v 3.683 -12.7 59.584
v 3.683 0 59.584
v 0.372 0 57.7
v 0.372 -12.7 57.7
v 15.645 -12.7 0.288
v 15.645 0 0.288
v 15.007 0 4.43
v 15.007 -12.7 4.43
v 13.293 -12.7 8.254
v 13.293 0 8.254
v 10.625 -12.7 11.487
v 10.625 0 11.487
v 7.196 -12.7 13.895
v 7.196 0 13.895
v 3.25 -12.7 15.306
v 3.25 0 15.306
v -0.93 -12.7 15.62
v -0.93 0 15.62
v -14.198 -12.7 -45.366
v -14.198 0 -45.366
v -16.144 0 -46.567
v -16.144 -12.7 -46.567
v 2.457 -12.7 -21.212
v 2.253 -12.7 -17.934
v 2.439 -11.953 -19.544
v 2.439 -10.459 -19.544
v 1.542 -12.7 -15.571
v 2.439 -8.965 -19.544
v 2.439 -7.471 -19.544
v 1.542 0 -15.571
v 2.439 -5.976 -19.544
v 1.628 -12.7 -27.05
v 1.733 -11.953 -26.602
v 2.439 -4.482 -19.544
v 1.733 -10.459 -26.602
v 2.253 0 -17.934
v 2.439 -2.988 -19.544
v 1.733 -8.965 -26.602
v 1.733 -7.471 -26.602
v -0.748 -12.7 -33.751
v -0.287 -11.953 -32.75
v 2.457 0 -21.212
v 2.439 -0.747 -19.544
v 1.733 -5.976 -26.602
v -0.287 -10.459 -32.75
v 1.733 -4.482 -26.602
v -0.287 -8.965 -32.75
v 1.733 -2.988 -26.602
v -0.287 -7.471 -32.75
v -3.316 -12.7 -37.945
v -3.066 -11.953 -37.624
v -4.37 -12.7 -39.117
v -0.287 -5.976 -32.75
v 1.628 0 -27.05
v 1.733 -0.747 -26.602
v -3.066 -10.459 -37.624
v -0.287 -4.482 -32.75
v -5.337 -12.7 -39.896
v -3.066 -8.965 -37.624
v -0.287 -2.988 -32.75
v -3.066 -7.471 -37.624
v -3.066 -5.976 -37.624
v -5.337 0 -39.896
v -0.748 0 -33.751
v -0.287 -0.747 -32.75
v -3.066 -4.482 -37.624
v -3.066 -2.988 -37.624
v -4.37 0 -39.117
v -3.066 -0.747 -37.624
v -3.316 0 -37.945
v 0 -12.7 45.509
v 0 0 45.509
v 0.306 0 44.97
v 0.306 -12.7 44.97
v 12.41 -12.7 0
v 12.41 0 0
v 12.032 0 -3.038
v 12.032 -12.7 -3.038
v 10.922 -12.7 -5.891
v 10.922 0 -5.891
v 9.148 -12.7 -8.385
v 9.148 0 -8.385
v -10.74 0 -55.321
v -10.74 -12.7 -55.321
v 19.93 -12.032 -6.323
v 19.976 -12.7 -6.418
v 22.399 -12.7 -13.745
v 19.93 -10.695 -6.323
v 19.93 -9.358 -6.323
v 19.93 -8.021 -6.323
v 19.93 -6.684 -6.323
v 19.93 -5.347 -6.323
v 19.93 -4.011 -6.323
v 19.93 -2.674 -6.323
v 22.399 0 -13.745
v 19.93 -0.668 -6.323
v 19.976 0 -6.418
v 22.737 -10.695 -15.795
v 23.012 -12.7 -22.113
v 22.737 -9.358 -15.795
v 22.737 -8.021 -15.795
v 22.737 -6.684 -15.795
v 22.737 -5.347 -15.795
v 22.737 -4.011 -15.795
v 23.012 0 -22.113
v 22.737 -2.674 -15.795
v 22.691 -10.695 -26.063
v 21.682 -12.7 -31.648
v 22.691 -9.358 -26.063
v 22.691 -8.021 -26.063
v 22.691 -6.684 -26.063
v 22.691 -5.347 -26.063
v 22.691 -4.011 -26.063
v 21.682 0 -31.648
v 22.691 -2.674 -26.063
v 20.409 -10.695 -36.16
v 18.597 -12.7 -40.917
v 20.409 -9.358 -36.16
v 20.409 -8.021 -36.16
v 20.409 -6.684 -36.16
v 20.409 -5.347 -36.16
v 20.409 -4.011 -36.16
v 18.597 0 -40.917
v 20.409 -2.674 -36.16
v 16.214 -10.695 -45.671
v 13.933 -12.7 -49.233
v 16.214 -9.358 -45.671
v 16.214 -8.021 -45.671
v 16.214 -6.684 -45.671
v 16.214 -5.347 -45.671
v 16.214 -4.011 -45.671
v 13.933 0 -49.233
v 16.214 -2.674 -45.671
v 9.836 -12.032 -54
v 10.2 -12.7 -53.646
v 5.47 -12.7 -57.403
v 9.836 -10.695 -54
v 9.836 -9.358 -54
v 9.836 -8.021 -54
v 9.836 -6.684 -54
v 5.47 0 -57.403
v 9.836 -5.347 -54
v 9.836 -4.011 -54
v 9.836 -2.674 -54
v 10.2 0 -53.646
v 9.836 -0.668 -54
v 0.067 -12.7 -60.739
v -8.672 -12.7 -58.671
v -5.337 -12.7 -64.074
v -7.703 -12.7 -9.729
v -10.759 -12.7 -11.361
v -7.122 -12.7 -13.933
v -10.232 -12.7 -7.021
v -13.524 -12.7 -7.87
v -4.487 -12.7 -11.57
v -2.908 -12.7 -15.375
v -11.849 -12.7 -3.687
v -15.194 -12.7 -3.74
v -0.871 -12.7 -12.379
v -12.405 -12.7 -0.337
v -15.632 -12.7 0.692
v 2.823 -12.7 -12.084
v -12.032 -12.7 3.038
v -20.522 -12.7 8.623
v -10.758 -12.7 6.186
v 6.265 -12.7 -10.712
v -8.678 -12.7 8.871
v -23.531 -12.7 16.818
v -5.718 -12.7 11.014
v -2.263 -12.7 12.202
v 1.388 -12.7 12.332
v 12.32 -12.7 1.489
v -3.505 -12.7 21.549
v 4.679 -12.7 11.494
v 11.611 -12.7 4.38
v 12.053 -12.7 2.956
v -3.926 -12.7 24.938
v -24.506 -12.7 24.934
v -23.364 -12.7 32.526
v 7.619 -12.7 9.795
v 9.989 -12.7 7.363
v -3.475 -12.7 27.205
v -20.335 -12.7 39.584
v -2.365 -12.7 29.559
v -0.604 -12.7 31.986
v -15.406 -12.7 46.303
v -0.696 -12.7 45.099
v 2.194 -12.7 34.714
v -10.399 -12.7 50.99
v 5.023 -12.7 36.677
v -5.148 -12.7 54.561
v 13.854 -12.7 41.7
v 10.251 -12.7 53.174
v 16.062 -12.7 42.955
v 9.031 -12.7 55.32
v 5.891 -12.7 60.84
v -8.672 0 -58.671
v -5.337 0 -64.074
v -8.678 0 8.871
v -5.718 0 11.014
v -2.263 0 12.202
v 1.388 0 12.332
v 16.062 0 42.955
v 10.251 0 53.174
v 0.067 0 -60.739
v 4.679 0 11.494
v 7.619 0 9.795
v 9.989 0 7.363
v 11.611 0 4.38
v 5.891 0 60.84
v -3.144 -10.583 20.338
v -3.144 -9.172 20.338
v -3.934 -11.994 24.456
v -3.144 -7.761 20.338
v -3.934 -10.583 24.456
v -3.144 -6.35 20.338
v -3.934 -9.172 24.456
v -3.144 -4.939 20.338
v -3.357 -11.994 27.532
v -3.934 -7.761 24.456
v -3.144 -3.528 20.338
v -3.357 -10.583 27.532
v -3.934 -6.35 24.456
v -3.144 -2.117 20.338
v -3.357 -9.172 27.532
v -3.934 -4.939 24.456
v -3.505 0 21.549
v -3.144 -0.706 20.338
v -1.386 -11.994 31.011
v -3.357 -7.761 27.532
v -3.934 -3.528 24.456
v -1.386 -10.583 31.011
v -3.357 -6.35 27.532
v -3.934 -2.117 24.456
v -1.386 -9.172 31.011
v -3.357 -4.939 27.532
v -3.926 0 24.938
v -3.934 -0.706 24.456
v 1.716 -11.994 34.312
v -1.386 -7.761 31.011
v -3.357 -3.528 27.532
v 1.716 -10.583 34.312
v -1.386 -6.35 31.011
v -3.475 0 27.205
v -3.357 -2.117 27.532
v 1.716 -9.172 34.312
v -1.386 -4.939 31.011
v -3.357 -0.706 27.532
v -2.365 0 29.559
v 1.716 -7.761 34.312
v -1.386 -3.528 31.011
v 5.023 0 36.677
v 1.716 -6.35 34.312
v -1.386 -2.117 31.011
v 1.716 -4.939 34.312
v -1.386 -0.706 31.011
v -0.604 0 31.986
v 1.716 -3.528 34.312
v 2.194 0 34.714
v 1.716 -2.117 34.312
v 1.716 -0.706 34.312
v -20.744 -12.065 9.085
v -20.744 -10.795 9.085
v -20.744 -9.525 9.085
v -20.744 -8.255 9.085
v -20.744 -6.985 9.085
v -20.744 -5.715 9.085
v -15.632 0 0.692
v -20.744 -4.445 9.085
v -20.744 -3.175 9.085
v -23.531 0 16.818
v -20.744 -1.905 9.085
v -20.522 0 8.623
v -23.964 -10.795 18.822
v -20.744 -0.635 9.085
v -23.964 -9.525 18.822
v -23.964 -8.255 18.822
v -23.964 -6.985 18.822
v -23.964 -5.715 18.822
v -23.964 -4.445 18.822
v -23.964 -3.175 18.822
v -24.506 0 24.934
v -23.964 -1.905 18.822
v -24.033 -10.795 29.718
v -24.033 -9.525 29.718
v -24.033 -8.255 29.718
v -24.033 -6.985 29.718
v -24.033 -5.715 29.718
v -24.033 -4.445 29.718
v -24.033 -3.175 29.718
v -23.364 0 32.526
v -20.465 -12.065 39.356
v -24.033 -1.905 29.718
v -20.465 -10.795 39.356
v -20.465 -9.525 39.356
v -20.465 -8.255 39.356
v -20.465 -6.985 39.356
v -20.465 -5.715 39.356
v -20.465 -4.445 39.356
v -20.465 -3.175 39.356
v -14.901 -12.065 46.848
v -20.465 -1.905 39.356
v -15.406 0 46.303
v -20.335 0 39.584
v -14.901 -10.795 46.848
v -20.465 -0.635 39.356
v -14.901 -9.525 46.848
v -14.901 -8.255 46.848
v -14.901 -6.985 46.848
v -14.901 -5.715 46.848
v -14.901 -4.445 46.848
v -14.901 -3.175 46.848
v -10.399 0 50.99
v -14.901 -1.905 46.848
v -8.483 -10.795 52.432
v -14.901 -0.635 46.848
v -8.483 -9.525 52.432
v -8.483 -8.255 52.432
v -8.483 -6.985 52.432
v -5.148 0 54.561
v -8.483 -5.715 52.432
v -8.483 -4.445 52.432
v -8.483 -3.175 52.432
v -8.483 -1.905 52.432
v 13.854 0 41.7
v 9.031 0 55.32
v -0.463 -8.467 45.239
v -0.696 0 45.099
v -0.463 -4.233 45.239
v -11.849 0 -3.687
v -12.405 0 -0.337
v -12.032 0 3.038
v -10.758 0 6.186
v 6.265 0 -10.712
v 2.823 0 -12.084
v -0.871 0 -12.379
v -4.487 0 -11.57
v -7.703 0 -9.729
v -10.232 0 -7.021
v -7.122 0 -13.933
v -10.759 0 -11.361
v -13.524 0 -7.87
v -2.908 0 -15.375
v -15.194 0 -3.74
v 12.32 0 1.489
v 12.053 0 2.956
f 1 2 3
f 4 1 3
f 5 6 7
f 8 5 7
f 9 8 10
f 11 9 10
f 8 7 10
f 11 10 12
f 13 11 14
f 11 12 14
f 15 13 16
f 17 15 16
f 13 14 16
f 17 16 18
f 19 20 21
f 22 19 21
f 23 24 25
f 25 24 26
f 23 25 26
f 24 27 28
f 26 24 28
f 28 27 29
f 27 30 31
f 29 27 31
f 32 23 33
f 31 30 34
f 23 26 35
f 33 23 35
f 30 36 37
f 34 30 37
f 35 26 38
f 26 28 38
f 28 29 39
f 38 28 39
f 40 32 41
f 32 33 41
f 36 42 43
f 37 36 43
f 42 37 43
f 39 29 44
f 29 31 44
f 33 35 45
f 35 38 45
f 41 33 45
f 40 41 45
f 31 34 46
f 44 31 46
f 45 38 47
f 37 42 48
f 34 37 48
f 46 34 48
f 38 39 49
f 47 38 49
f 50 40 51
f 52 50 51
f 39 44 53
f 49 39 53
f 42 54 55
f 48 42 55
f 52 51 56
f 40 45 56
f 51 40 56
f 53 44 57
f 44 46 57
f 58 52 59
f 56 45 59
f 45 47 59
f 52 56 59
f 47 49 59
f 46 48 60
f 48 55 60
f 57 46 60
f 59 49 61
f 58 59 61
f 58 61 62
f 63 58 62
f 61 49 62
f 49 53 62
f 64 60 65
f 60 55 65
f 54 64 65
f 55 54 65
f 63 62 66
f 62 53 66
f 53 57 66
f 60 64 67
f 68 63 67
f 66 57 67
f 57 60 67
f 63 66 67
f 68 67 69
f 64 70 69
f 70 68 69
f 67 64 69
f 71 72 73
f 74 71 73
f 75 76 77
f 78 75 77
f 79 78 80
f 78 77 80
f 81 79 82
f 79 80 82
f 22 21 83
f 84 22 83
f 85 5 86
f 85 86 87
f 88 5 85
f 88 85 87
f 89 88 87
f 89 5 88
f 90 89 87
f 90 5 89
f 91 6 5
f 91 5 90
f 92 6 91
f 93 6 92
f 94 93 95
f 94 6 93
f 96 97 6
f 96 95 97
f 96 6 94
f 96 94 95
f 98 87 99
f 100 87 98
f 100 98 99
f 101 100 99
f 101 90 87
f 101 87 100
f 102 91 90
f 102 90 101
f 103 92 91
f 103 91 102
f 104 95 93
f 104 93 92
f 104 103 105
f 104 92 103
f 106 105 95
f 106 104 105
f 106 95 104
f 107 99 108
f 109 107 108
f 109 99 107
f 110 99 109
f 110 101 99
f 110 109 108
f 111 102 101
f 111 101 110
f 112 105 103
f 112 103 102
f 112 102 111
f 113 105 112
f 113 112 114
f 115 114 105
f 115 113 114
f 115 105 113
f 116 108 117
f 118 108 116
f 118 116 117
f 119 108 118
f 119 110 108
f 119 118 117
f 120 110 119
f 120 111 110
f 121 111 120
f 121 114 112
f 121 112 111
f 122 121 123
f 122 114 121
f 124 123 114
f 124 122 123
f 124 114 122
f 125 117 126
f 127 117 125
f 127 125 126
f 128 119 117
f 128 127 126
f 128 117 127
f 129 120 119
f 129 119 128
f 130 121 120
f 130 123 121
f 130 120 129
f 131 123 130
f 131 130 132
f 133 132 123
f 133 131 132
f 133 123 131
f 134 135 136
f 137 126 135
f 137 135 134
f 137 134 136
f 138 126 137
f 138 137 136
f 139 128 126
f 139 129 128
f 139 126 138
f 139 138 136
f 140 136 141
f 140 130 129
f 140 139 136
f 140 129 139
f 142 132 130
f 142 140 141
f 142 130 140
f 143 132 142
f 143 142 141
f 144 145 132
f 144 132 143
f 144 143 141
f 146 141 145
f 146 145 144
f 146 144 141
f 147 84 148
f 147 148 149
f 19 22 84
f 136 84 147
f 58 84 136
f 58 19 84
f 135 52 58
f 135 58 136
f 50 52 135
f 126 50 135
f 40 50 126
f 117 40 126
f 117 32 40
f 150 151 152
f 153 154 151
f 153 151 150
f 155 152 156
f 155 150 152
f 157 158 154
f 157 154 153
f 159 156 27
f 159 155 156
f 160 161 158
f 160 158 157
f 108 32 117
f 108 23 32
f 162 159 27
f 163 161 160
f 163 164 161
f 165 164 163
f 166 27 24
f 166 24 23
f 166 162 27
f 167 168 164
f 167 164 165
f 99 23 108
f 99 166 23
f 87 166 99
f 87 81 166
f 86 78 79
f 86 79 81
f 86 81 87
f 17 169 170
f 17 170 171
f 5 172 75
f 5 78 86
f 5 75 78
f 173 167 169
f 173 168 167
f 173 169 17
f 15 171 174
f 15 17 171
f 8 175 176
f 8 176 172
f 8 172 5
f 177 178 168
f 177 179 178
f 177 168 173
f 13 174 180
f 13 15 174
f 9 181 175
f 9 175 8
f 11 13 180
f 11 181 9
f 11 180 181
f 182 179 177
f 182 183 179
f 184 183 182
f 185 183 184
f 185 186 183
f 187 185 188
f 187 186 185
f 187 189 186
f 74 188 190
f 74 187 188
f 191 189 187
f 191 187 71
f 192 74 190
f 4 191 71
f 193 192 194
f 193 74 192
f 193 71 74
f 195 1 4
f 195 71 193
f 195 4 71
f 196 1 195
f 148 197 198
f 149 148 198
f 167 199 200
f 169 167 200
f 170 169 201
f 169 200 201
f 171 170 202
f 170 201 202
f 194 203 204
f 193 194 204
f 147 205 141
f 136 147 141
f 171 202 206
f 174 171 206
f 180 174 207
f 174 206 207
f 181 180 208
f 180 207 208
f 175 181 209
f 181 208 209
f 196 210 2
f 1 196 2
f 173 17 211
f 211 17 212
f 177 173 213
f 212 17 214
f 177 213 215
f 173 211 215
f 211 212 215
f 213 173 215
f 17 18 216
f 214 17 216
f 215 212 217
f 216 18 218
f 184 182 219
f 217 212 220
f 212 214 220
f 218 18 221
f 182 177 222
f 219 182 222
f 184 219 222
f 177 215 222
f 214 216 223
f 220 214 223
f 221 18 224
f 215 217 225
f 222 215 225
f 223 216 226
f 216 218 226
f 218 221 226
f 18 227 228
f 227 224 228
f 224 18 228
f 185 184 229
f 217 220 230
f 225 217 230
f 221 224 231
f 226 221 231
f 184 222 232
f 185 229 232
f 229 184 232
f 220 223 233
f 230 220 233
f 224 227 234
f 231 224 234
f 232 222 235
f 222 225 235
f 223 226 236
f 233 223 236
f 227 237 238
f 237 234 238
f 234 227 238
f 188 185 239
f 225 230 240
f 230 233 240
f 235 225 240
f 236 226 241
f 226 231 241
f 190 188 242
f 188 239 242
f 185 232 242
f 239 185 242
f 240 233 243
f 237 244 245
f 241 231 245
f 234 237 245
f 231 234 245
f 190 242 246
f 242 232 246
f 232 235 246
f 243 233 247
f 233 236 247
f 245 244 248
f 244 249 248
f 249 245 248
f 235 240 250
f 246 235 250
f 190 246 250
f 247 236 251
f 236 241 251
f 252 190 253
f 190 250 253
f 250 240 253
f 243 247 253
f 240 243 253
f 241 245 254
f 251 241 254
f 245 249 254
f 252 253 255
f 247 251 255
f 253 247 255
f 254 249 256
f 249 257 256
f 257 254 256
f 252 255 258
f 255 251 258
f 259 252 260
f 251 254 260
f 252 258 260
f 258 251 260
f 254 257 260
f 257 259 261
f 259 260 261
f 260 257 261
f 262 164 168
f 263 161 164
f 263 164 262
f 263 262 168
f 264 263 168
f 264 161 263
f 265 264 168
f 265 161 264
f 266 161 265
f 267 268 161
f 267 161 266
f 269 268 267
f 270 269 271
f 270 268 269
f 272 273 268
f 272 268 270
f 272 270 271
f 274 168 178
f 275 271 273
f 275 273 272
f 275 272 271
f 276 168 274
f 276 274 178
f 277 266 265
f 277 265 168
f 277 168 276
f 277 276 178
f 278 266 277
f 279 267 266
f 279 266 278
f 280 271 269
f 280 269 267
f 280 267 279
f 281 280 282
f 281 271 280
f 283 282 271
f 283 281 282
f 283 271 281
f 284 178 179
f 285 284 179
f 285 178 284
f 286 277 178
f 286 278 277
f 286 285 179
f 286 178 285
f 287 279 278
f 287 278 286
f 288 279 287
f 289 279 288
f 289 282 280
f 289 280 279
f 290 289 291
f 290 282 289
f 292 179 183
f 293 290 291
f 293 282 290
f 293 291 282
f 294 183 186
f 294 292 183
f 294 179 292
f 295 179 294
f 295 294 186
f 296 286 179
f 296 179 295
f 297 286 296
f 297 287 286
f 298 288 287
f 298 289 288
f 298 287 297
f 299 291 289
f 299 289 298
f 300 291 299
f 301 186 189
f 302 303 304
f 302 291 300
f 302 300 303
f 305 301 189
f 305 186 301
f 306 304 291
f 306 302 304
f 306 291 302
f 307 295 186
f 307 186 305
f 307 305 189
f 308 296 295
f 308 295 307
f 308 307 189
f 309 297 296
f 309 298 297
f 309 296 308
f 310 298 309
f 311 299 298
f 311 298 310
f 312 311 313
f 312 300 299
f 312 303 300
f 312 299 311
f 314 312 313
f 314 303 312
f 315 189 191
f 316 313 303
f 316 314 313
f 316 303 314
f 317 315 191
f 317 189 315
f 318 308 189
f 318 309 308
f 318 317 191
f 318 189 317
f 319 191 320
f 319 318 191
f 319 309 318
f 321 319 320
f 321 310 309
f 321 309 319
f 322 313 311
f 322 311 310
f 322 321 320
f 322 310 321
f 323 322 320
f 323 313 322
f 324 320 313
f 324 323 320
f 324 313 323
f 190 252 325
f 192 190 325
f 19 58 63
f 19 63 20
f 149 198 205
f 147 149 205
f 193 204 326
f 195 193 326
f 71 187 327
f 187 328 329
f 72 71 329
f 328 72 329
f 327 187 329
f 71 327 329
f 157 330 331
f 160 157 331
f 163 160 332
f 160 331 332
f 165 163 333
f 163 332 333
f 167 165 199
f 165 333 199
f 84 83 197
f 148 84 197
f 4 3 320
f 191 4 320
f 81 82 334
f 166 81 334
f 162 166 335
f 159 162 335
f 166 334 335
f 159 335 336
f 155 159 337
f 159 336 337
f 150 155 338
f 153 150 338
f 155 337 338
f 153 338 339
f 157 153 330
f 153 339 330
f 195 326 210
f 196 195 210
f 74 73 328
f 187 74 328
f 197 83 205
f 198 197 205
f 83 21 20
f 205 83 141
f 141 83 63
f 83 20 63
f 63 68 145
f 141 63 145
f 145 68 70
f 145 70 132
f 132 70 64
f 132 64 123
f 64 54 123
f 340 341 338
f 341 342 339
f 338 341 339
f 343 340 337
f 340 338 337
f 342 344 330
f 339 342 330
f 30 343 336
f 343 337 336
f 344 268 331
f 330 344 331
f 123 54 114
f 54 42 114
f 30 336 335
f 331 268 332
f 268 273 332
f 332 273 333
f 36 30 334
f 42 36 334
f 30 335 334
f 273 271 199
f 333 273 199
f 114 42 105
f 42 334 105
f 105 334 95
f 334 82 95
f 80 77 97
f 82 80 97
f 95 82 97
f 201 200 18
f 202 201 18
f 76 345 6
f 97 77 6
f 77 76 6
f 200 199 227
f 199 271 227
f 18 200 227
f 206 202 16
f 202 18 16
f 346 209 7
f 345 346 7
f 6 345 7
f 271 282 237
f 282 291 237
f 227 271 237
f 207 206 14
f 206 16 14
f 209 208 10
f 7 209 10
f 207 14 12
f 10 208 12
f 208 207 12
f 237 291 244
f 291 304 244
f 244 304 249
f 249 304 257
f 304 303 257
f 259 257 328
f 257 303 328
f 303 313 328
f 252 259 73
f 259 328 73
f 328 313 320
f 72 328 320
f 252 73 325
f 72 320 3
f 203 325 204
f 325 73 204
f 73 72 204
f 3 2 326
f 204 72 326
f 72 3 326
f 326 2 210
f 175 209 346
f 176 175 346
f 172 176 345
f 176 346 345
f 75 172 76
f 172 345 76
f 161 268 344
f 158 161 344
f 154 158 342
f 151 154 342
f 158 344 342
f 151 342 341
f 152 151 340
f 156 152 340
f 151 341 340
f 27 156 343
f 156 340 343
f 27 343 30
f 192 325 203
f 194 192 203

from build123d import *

# Parameters (mm, degrees)
F1_DEPTH = 12.7


# Not quite as in the source:
# - the dataset's text gives a spline's control points without its knots; the knots are read off the source's solid


with BuildPart() as f1:
    # F0 (on Front) → F1 (new body)
    with BuildSketch(Plane.XZ):
        with BuildLine():
            ThreePointArc((-11.8491375073, -3.6874569895), (-12.0319508259, 3.038347913), (-8.6778355467, 8.8709959385))
            add(Edge.make_bspline(
                [(-8.6778355467, 8.8709959385), (-9.2853744088, 9.7814260815), (-9.8597528454, 10.7272806041), (-10.3912226552, 11.6988451747)],
                knots=[0.2252802502, 0.2252802502, 0.2252802502, 0.2252802502, 0.2789767598, 0.2789767598, 0.2789767598, 0.2789767598], degree=3))
            ThreePointArc((-10.3912226552, 11.6988451747), (-14.1275753459, 6.7269682278), (-15.6320541614, 0.6923650678))
            add(Edge.make_bspline(
                [(-11.8491375073, -3.6874569895), (-12.0986304351, -3.4342357303), (-13.4209716173, -2.0574119677), (-14.6688396939, -0.5758176521), (-15.6320541614, 0.6923650678)],
                knots=[0.1107256969, 0.1107256969, 0.1107256969, 0.1107256969, 0.125, 0.187209023, 0.187209023, 0.187209023, 0.187209023], degree=3))
        make_face()
        with BuildLine():
            add(Edge.make_bspline(
                [(-8.6778355467, 8.8709959385), (-9.2853744088, 9.7814260815), (-9.8597528454, 10.7272806041), (-10.3912226552, 11.6988451747)],
                knots=[0.2252802502, 0.2252802502, 0.2252802502, 0.2252802502, 0.2789767598, 0.2789767598, 0.2789767598, 0.2789767598], degree=3))
            ThreePointArc((-8.6778355467, 8.8709959385), (-4.0348074378, 11.7354048782), (1.3880039263, 12.331781859))
            add(Edge.make_bspline(
                [(1.3880039263, 12.331781859), (1.1715122405, 12.5949393869), (0.3992065245, 13.5716380523), (-0.3737885205, 14.7019009055), (-0.8950079656, 15.5620901399), (-0.929649614, 15.6197387394)],
                knots=[0.1633568702, 0.1633568702, 0.1633568702, 0.1633568702, 0.1875, 0.25, 0.2544794081, 0.2544794081, 0.2544794081, 0.2544794081], degree=3))
            ThreePointArc((-0.929649614, 15.6197387394), (-5.9903162538, 14.4553311228), (-10.3912226552, 11.6988451747))
        make_face()
        with BuildLine():
            ThreePointArc((12.4096494196, 0), (11.5655450275, -4.4986183361), (9.1480638179, -8.3852446058))
            add(Edge.make_bspline(
                [(9.1480638179, -8.3852446058), (9.7633588854, -9.3122728001), (10.3114373795, -10.2956591108), (10.7802117804, -11.3414073492)],
                knots=[0.2554886882, 0.2554886882, 0.2554886882, 0.2554886882, 0.3234426707, 0.3234426707, 0.3234426707, 0.3234426707], degree=3))
            ThreePointArc((10.7802117804, -11.3414073492), (14.3791959444, -6.1708354931), (15.6473795471, 0))
            ThreePointArc((15.6473795471, 0), (15.6467175307, 0.1439347261), (15.6447315375, 0.2878572728))
            add(Edge.make_bspline(
                [(11.6109564261, 4.3800787194), (11.6883935226, 4.3126793989), (12.801065895, 3.3367304215), (14.1660004984, 2.000745319), (15.3850396401, 0.5978206791), (15.6447315375, 0.2878572728)],
                knots=[0.1203328038, 0.1203328038, 0.1203328038, 0.1203328038, 0.125, 0.1875, 0.2047375018, 0.2047375018, 0.2047375018, 0.2047375018], degree=3))
            ThreePointArc((11.6109564261, 4.3800787194), (12.208343405, 2.2261513923), (12.4096494196, 0))
        make_face()
        with BuildLine():
            add(Edge.make_bspline(
                [(9.1480638179, -8.3852446058), (9.7633588854, -9.3122728001), (10.3114373795, -10.2956591108), (10.7802117804, -11.3414073492)],
                knots=[0.2554886882, 0.2554886882, 0.2554886882, 0.2554886882, 0.3234426707, 0.3234426707, 0.3234426707, 0.3234426707], degree=3))
            ThreePointArc((9.1480638179, -8.3852446058), (4.7241366094, -11.4752748121), (-0.5930675386, -12.3954697213))
            add(Edge.make_bspline(
                [(-0.5930675386, -12.3954697213), (-0.5422251349, -12.4502827191), (-0.0893674975, -12.9460413617), (0.6470698049, -13.8821382909), (1.2271907242, -14.8823314511), (1.4942386676, -15.4627127324), (1.5418348503, -15.5712309078)],
                knots=[0.1797309234, 0.1797309234, 0.1797309234, 0.1797309234, 0.1875, 0.25, 0.3125, 0.326664828, 0.326664828, 0.326664828, 0.326664828], degree=3))
            ThreePointArc((1.5418348503, -15.5712309078), (6.5139128123, -14.2270666887), (10.7802117804, -11.3414073492))
        make_face()
        with BuildLine():
            ThreePointArc((-15.6320541614, 0.6923650678), (-14.1275753459, 6.7269682278), (-10.3912226552, 11.6988451747))
            add(Edge.make_bspline(
                [(-10.3912226552, 11.6988451747), (-12.8029404637, 16.1076366694), (-17.2123471815, 30.3566232389), (-6.6813074108, 41.4558396662), (-0.6964705023, 45.0986841551)],
                knots=[0.2789767598, 0.2789767598, 0.2789767598, 0.2789767598, 0.5226422061, 0.9820627069, 0.9820627069, 0.9820627069, 0.9820627069], degree=3))
            add(Edge.make_bspline(
                [(-0.6964705023, 45.0986841551), (-0.4628027101, 45.240912831), (-0.2305015334, 45.377638856), (0, 45.5087274313)],
                knots=[0.9820627069, 0.9820627069, 0.9820627069, 0.9820627069, 1, 1, 1, 1], degree=3))
            Line((0, 45.5087274313), (-5.1482294751, 54.5611928011))
            add(Edge.make_bspline(
                [(-15.6320541614, 0.6923650678), (-15.636559509, 0.6982968766), (-16.6085403024, 1.978641132), (-18.442751654, 4.6616170097), (-20.8194846225, 9.0288333995), (-22.7427732281, 13.7302890055), (-23.866202795, 17.9262301222), (-24.3194859098, 21.0117640249), (-24.4669610536, 22.8159468829), (-24.5172239147, 24.1889005784), (-24.502571598, 25.579766526), (-24.388031674, 27.4585942739), (-24.0729268068, 29.7376311161), (-23.4541878049, 32.3541134778), (-22.6288454178, 34.8352906061), (-21.6295067826, 37.1769157355), (-20.1035209307, 40.1126812586), (-17.8979428955, 43.4406369139), (-14.9345931184, 46.9263269169), (-11.7707761701, 49.9398108312), (-8.4930608318, 52.5043610495), (-6.269432358, 53.9235532749), (-5.1482294751, 54.5611928011)],
                knots=[0.187209023, 0.187209023, 0.187209023, 0.187209023, 0.1875, 0.25, 0.3125, 0.375, 0.4375, 0.46875, 0.484375, 0.5, 0.515625, 0.53125, 0.5625, 0.59375, 0.625, 0.65625, 0.6875, 0.75, 0.8125, 0.875, 0.9375, 1, 1, 1, 1], degree=3))
        make_face()
        with BuildLine():
            add(Edge.make_bspline(
                [(-10.3912226552, 11.6988451747), (-12.8029404637, 16.1076366694), (-17.2123471815, 30.3566232389), (-6.6813074108, 41.4558396662), (-0.6964705023, 45.0986841551)],
                knots=[0.2789767598, 0.2789767598, 0.2789767598, 0.2789767598, 0.5226422061, 0.9820627069, 0.9820627069, 0.9820627069, 0.9820627069], degree=3))
            ThreePointArc((-10.3912226552, 11.6988451747), (-5.9903162538, 14.4553311228), (-0.929649614, 15.6197387394))
            add(Edge.make_bspline(
                [(-0.929649614, 15.6197387394), (-1.378353745, 16.3664458385), (-2.2350758783, 17.9598118494), (-3.2119329355, 20.3694931918), (-3.7060132508, 22.267017983), (-3.8731893948, 23.4296691454), (-3.9222634293, 24.0367170821), (-3.9374083126, 24.4611674633), (-3.9326943692, 24.8538568084), (-3.9034333763, 25.3305962326), (-3.8198337247, 25.9465502567), (-3.6393425731, 26.7167285079), (-3.3722246374, 27.525901957), (-3.0139222068, 28.3697964463), (-2.4132338328, 29.5303307169), (-1.436511786, 31.0185840281), (0.0361873799, 32.7590338295), (1.7057339174, 34.3516547718), (3.4394466992, 35.7061480035), (4.5298073789, 36.3967620304), (5.0226628601, 36.6770539743)],
                knots=[0.2544794081, 0.2544794081, 0.2544794081, 0.2544794081, 0.3125, 0.375, 0.4375, 0.46875, 0.484375, 0.5, 0.515625, 0.53125, 0.5625, 0.59375, 0.625, 0.65625, 0.6875, 0.75, 0.8125, 0.875, 0.9375, 1, 1, 1, 1], degree=3))
            Line((5.0226628601, 36.6770539743), (0.3061173234, 44.9704615124))
            Line((0.3061173234, 44.9704615124), (-0.6964705023, 45.0986841551))
        make_face()
        with BuildLine():
            add(Edge.make_bspline(
                [(1.3880039263, 12.331781859), (1.1715122405, 12.5949393869), (0.3992065245, 13.5716380523), (-0.3737885205, 14.7019009055), (-0.8950079656, 15.5620901399), (-0.929649614, 15.6197387394)],
                knots=[0.1633568702, 0.1633568702, 0.1633568702, 0.1633568702, 0.1875, 0.25, 0.2544794081, 0.2544794081, 0.2544794081, 0.2544794081], degree=3))
            ThreePointArc((1.3880039263, 12.331781859), (7.6190969455, 9.7953438148), (11.6109564261, 4.3800787194))
            add(Edge.make_bspline(
                [(11.6109564261, 4.3800787194), (11.6883935226, 4.3126793989), (12.801065895, 3.3367304215), (14.1660004984, 2.000745319), (15.3850396401, 0.5978206791), (15.6447315375, 0.2878572728)],
                knots=[0.1203328038, 0.1203328038, 0.1203328038, 0.1203328038, 0.125, 0.1875, 0.2047375018, 0.2047375018, 0.2047375018, 0.2047375018], degree=3))
            ThreePointArc((15.6447315375, 0.2878572728), (10.625443818, 11.4865325647), (-0.929649614, 15.6197387394))
        make_face()
        with BuildLine():
            ThreePointArc((-0.5930675386, -12.3954697213), (-7.5933844915, -9.8152896381), (-11.8491375073, -3.6874569895))
            add(Edge.make_bspline(
                [(-11.8491375073, -3.6874569895), (-12.0986304351, -3.4342357303), (-13.4209716173, -2.0574119677), (-14.6688396939, -0.5758176521), (-15.6320541614, 0.6923650678)],
                knots=[0.1107256969, 0.1107256969, 0.1107256969, 0.1107256969, 0.125, 0.187209023, 0.187209023, 0.187209023, 0.187209023], degree=3))
            ThreePointArc((-15.6320541614, 0.6923650678), (-10.7591685819, -11.3613721934), (1.5418348503, -15.5712309078))
            add(Edge.make_bspline(
                [(-0.5930675386, -12.3954697213), (-0.5422251349, -12.4502827191), (-0.0893674975, -12.9460413617), (0.6470698049, -13.8821382909), (1.2271907242, -14.8823314511), (1.4942386676, -15.4627127324), (1.5418348503, -15.5712309078)],
                knots=[0.1797309234, 0.1797309234, 0.1797309234, 0.1797309234, 0.1875, 0.25, 0.3125, 0.326664828, 0.326664828, 0.326664828, 0.326664828], degree=3))
        make_face()
        with BuildLine():
            ThreePointArc((15.6473795471, 0), (14.3791959444, -6.1708354931), (10.7802117804, -11.3414073492))
            add(Edge.make_bspline(
                [(10.7802117804, -11.3414073492), (11.6264835061, -13.229281697), (14.8682711517, -24.7617360554), (8.08607989, -43.5501283525), (0, -48.5415357893)],
                knots=[0.3234426707, 0.3234426707, 0.3234426707, 0.3234426707, 0.446119024, 1, 1, 1, 1], degree=3))
            Line((0, -48.5415357893), (5.4701533549, -57.4031840516))
            add(Edge.make_bspline(
                [(15.6447315375, 0.2878572728), (16.3266345282, -0.5260494212), (17.8871346304, -2.5735124946), (19.6343071308, -5.5649885279), (20.9151883898, -8.5103892259), (21.7132531018, -10.8356150551), (22.3344664493, -13.2646623418), (22.6966343535, -15.3618244109), (22.8903478004, -17.0806012193), (23.0186382679, -18.796096541), (23.0662198627, -20.9378919201), (22.9630569039, -23.5038601417), (22.6309798906, -26.9181954555), (21.878352145, -31.1655622837), (20.48723974, -36.1834140821), (18.6296401775, -41.0581085457), (16.2998809407, -45.718972551), (13.452397619, -50.0911504281), (10.5555341156, -53.4229665407), (7.8168542439, -55.8195818603), (6.2831768326, -56.9013176976), (5.4701533549, -57.4031840516)],
                knots=[0.2047375018, 0.2047375018, 0.2047375018, 0.2047375018, 0.25, 0.3125, 0.34375, 0.375, 0.40625, 0.4375, 0.453125, 0.46875, 0.5, 0.53125, 0.5625, 0.625, 0.6875, 0.75, 0.8125, 0.875, 0.9375, 0.96875, 1, 1, 1, 1], degree=3))
            ThreePointArc((15.6447315375, 0.2878572728), (15.6467175307, 0.1439347261), (15.6473795471, 0))
        make_face()
        with BuildLine():
            add(Edge.make_bspline(
                [(10.7802117804, -11.3414073492), (11.6264835061, -13.229281697), (14.8682711517, -24.7617360554), (8.08607989, -43.5501283525), (0, -48.5415357893)],
                knots=[0.3234426707, 0.3234426707, 0.3234426707, 0.3234426707, 0.446119024, 1, 1, 1, 1], degree=3))
            ThreePointArc((10.7802117804, -11.3414073492), (6.5139128123, -14.2270666887), (1.5418348503, -15.5712309078))
            add(Edge.make_bspline(
                [(1.5418348503, -15.5712309078), (1.5992438757, -15.7021221335), (1.7544783645, -16.0777122744), (1.9777658515, -16.7272947355), (2.1915014853, -17.5590215657), (2.3250200741, -18.3262912642), (2.4004010179, -18.9913445586), (2.4554405815, -19.718914297), (2.4799779419, -20.7306801507), (2.4275831434, -22.0764789614), (2.2418770735, -24.0043519572), (1.7882246185, -26.5906690812), (0.9098712215, -29.7617893454), (-0.2521338933, -32.8032773219), (-1.6209855373, -35.5242995778), (-3.0809606838, -37.7381050829), (-4.2238837122, -39.0131375196), (-4.9541458564, -39.6412317653), (-5.2286217969, -39.8292882956), (-5.3367351858, -39.8960249567)],
                knots=[0.326664828, 0.326664828, 0.326664828, 0.326664828, 0.34375, 0.375, 0.40625, 0.4375, 0.453125, 0.46875, 0.5, 0.53125, 0.5625, 0.625, 0.6875, 0.75, 0.8125, 0.875, 0.9375, 0.96875, 1, 1, 1, 1], degree=3))
            Line((-5.3367351858, -39.8960249567), (0, -48.5415357893))
        make_face()
        Polygon((-13.237771211, -46.922370502), (0, -48.5415357893), (-5.3367351858, -39.8960249567), (-14.1983836254, -45.366178421), align=None)
        Polygon((5.4701533549, -57.4031840516), (0, -48.5415357893), (-13.237771211, -46.922370502), (-7.8223193044, -55.6954024197), align=None)
        Polygon((-5.1482294751, 54.5611928011), (0, 45.5087274313), (0.3061173234, 44.9704615124), (12.9110272843, 43.3583983844), (7.1709556817, 53.4515381045), align=None)
        Polygon((12.9110272843, 43.3583983844), (0.3061173234, 44.9704615124), (5.0226628601, 36.6770539743), (13.8543363917, 41.6997168768), align=None)
        Polygon((0.3715664821, 57.7003571152), (-5.1482294751, 54.5611928011), (7.1709556817, 53.4515381045), (3.6834440565, 59.5838557036), align=None)
        Polygon((0.0667090845, -60.7386435427), (5.4701533549, -57.4031840516), (-7.8223193044, -55.6954024197), (-3.3914950846, -62.8733375159), align=None)
        Polygon((-7.8223193044, -55.6954024197), (-13.237771211, -46.922370502), (-16.1436237266, -46.566943939), (-10.7401794562, -55.3205234864), align=None)
        Polygon((-16.1436237266, -46.566943939), (-13.237771211, -46.922370502), (-14.1983836254, -45.366178421), align=None)
        Polygon((7.1709556817, 53.4515381045), (12.9110272843, 43.3583983844), (16.0622547746, 42.9553826024), (10.2507519709, 53.1741244303), align=None)
        Polygon((16.0622547746, 42.9553826024), (12.9110272843, 43.3583983844), (13.8543363917, 41.6997168768), align=None)
        Polygon((3.6834440565, 59.5838557036), (7.1709556817, 53.4515381045), (10.2507519709, 53.1741244303), (9.0305267534, 55.319725472), (5.8913624394, 60.8395214293), align=None)
        Polygon((-3.3914950846, -62.8733375159), (-7.8223193044, -55.6954024197), (-10.7401794562, -55.3205234864), (-8.672194677, -58.6706587635), (-5.3367351858, -64.0741030339), align=None)
    extrude(amount=F1_DEPTH)


solid = f1.part
